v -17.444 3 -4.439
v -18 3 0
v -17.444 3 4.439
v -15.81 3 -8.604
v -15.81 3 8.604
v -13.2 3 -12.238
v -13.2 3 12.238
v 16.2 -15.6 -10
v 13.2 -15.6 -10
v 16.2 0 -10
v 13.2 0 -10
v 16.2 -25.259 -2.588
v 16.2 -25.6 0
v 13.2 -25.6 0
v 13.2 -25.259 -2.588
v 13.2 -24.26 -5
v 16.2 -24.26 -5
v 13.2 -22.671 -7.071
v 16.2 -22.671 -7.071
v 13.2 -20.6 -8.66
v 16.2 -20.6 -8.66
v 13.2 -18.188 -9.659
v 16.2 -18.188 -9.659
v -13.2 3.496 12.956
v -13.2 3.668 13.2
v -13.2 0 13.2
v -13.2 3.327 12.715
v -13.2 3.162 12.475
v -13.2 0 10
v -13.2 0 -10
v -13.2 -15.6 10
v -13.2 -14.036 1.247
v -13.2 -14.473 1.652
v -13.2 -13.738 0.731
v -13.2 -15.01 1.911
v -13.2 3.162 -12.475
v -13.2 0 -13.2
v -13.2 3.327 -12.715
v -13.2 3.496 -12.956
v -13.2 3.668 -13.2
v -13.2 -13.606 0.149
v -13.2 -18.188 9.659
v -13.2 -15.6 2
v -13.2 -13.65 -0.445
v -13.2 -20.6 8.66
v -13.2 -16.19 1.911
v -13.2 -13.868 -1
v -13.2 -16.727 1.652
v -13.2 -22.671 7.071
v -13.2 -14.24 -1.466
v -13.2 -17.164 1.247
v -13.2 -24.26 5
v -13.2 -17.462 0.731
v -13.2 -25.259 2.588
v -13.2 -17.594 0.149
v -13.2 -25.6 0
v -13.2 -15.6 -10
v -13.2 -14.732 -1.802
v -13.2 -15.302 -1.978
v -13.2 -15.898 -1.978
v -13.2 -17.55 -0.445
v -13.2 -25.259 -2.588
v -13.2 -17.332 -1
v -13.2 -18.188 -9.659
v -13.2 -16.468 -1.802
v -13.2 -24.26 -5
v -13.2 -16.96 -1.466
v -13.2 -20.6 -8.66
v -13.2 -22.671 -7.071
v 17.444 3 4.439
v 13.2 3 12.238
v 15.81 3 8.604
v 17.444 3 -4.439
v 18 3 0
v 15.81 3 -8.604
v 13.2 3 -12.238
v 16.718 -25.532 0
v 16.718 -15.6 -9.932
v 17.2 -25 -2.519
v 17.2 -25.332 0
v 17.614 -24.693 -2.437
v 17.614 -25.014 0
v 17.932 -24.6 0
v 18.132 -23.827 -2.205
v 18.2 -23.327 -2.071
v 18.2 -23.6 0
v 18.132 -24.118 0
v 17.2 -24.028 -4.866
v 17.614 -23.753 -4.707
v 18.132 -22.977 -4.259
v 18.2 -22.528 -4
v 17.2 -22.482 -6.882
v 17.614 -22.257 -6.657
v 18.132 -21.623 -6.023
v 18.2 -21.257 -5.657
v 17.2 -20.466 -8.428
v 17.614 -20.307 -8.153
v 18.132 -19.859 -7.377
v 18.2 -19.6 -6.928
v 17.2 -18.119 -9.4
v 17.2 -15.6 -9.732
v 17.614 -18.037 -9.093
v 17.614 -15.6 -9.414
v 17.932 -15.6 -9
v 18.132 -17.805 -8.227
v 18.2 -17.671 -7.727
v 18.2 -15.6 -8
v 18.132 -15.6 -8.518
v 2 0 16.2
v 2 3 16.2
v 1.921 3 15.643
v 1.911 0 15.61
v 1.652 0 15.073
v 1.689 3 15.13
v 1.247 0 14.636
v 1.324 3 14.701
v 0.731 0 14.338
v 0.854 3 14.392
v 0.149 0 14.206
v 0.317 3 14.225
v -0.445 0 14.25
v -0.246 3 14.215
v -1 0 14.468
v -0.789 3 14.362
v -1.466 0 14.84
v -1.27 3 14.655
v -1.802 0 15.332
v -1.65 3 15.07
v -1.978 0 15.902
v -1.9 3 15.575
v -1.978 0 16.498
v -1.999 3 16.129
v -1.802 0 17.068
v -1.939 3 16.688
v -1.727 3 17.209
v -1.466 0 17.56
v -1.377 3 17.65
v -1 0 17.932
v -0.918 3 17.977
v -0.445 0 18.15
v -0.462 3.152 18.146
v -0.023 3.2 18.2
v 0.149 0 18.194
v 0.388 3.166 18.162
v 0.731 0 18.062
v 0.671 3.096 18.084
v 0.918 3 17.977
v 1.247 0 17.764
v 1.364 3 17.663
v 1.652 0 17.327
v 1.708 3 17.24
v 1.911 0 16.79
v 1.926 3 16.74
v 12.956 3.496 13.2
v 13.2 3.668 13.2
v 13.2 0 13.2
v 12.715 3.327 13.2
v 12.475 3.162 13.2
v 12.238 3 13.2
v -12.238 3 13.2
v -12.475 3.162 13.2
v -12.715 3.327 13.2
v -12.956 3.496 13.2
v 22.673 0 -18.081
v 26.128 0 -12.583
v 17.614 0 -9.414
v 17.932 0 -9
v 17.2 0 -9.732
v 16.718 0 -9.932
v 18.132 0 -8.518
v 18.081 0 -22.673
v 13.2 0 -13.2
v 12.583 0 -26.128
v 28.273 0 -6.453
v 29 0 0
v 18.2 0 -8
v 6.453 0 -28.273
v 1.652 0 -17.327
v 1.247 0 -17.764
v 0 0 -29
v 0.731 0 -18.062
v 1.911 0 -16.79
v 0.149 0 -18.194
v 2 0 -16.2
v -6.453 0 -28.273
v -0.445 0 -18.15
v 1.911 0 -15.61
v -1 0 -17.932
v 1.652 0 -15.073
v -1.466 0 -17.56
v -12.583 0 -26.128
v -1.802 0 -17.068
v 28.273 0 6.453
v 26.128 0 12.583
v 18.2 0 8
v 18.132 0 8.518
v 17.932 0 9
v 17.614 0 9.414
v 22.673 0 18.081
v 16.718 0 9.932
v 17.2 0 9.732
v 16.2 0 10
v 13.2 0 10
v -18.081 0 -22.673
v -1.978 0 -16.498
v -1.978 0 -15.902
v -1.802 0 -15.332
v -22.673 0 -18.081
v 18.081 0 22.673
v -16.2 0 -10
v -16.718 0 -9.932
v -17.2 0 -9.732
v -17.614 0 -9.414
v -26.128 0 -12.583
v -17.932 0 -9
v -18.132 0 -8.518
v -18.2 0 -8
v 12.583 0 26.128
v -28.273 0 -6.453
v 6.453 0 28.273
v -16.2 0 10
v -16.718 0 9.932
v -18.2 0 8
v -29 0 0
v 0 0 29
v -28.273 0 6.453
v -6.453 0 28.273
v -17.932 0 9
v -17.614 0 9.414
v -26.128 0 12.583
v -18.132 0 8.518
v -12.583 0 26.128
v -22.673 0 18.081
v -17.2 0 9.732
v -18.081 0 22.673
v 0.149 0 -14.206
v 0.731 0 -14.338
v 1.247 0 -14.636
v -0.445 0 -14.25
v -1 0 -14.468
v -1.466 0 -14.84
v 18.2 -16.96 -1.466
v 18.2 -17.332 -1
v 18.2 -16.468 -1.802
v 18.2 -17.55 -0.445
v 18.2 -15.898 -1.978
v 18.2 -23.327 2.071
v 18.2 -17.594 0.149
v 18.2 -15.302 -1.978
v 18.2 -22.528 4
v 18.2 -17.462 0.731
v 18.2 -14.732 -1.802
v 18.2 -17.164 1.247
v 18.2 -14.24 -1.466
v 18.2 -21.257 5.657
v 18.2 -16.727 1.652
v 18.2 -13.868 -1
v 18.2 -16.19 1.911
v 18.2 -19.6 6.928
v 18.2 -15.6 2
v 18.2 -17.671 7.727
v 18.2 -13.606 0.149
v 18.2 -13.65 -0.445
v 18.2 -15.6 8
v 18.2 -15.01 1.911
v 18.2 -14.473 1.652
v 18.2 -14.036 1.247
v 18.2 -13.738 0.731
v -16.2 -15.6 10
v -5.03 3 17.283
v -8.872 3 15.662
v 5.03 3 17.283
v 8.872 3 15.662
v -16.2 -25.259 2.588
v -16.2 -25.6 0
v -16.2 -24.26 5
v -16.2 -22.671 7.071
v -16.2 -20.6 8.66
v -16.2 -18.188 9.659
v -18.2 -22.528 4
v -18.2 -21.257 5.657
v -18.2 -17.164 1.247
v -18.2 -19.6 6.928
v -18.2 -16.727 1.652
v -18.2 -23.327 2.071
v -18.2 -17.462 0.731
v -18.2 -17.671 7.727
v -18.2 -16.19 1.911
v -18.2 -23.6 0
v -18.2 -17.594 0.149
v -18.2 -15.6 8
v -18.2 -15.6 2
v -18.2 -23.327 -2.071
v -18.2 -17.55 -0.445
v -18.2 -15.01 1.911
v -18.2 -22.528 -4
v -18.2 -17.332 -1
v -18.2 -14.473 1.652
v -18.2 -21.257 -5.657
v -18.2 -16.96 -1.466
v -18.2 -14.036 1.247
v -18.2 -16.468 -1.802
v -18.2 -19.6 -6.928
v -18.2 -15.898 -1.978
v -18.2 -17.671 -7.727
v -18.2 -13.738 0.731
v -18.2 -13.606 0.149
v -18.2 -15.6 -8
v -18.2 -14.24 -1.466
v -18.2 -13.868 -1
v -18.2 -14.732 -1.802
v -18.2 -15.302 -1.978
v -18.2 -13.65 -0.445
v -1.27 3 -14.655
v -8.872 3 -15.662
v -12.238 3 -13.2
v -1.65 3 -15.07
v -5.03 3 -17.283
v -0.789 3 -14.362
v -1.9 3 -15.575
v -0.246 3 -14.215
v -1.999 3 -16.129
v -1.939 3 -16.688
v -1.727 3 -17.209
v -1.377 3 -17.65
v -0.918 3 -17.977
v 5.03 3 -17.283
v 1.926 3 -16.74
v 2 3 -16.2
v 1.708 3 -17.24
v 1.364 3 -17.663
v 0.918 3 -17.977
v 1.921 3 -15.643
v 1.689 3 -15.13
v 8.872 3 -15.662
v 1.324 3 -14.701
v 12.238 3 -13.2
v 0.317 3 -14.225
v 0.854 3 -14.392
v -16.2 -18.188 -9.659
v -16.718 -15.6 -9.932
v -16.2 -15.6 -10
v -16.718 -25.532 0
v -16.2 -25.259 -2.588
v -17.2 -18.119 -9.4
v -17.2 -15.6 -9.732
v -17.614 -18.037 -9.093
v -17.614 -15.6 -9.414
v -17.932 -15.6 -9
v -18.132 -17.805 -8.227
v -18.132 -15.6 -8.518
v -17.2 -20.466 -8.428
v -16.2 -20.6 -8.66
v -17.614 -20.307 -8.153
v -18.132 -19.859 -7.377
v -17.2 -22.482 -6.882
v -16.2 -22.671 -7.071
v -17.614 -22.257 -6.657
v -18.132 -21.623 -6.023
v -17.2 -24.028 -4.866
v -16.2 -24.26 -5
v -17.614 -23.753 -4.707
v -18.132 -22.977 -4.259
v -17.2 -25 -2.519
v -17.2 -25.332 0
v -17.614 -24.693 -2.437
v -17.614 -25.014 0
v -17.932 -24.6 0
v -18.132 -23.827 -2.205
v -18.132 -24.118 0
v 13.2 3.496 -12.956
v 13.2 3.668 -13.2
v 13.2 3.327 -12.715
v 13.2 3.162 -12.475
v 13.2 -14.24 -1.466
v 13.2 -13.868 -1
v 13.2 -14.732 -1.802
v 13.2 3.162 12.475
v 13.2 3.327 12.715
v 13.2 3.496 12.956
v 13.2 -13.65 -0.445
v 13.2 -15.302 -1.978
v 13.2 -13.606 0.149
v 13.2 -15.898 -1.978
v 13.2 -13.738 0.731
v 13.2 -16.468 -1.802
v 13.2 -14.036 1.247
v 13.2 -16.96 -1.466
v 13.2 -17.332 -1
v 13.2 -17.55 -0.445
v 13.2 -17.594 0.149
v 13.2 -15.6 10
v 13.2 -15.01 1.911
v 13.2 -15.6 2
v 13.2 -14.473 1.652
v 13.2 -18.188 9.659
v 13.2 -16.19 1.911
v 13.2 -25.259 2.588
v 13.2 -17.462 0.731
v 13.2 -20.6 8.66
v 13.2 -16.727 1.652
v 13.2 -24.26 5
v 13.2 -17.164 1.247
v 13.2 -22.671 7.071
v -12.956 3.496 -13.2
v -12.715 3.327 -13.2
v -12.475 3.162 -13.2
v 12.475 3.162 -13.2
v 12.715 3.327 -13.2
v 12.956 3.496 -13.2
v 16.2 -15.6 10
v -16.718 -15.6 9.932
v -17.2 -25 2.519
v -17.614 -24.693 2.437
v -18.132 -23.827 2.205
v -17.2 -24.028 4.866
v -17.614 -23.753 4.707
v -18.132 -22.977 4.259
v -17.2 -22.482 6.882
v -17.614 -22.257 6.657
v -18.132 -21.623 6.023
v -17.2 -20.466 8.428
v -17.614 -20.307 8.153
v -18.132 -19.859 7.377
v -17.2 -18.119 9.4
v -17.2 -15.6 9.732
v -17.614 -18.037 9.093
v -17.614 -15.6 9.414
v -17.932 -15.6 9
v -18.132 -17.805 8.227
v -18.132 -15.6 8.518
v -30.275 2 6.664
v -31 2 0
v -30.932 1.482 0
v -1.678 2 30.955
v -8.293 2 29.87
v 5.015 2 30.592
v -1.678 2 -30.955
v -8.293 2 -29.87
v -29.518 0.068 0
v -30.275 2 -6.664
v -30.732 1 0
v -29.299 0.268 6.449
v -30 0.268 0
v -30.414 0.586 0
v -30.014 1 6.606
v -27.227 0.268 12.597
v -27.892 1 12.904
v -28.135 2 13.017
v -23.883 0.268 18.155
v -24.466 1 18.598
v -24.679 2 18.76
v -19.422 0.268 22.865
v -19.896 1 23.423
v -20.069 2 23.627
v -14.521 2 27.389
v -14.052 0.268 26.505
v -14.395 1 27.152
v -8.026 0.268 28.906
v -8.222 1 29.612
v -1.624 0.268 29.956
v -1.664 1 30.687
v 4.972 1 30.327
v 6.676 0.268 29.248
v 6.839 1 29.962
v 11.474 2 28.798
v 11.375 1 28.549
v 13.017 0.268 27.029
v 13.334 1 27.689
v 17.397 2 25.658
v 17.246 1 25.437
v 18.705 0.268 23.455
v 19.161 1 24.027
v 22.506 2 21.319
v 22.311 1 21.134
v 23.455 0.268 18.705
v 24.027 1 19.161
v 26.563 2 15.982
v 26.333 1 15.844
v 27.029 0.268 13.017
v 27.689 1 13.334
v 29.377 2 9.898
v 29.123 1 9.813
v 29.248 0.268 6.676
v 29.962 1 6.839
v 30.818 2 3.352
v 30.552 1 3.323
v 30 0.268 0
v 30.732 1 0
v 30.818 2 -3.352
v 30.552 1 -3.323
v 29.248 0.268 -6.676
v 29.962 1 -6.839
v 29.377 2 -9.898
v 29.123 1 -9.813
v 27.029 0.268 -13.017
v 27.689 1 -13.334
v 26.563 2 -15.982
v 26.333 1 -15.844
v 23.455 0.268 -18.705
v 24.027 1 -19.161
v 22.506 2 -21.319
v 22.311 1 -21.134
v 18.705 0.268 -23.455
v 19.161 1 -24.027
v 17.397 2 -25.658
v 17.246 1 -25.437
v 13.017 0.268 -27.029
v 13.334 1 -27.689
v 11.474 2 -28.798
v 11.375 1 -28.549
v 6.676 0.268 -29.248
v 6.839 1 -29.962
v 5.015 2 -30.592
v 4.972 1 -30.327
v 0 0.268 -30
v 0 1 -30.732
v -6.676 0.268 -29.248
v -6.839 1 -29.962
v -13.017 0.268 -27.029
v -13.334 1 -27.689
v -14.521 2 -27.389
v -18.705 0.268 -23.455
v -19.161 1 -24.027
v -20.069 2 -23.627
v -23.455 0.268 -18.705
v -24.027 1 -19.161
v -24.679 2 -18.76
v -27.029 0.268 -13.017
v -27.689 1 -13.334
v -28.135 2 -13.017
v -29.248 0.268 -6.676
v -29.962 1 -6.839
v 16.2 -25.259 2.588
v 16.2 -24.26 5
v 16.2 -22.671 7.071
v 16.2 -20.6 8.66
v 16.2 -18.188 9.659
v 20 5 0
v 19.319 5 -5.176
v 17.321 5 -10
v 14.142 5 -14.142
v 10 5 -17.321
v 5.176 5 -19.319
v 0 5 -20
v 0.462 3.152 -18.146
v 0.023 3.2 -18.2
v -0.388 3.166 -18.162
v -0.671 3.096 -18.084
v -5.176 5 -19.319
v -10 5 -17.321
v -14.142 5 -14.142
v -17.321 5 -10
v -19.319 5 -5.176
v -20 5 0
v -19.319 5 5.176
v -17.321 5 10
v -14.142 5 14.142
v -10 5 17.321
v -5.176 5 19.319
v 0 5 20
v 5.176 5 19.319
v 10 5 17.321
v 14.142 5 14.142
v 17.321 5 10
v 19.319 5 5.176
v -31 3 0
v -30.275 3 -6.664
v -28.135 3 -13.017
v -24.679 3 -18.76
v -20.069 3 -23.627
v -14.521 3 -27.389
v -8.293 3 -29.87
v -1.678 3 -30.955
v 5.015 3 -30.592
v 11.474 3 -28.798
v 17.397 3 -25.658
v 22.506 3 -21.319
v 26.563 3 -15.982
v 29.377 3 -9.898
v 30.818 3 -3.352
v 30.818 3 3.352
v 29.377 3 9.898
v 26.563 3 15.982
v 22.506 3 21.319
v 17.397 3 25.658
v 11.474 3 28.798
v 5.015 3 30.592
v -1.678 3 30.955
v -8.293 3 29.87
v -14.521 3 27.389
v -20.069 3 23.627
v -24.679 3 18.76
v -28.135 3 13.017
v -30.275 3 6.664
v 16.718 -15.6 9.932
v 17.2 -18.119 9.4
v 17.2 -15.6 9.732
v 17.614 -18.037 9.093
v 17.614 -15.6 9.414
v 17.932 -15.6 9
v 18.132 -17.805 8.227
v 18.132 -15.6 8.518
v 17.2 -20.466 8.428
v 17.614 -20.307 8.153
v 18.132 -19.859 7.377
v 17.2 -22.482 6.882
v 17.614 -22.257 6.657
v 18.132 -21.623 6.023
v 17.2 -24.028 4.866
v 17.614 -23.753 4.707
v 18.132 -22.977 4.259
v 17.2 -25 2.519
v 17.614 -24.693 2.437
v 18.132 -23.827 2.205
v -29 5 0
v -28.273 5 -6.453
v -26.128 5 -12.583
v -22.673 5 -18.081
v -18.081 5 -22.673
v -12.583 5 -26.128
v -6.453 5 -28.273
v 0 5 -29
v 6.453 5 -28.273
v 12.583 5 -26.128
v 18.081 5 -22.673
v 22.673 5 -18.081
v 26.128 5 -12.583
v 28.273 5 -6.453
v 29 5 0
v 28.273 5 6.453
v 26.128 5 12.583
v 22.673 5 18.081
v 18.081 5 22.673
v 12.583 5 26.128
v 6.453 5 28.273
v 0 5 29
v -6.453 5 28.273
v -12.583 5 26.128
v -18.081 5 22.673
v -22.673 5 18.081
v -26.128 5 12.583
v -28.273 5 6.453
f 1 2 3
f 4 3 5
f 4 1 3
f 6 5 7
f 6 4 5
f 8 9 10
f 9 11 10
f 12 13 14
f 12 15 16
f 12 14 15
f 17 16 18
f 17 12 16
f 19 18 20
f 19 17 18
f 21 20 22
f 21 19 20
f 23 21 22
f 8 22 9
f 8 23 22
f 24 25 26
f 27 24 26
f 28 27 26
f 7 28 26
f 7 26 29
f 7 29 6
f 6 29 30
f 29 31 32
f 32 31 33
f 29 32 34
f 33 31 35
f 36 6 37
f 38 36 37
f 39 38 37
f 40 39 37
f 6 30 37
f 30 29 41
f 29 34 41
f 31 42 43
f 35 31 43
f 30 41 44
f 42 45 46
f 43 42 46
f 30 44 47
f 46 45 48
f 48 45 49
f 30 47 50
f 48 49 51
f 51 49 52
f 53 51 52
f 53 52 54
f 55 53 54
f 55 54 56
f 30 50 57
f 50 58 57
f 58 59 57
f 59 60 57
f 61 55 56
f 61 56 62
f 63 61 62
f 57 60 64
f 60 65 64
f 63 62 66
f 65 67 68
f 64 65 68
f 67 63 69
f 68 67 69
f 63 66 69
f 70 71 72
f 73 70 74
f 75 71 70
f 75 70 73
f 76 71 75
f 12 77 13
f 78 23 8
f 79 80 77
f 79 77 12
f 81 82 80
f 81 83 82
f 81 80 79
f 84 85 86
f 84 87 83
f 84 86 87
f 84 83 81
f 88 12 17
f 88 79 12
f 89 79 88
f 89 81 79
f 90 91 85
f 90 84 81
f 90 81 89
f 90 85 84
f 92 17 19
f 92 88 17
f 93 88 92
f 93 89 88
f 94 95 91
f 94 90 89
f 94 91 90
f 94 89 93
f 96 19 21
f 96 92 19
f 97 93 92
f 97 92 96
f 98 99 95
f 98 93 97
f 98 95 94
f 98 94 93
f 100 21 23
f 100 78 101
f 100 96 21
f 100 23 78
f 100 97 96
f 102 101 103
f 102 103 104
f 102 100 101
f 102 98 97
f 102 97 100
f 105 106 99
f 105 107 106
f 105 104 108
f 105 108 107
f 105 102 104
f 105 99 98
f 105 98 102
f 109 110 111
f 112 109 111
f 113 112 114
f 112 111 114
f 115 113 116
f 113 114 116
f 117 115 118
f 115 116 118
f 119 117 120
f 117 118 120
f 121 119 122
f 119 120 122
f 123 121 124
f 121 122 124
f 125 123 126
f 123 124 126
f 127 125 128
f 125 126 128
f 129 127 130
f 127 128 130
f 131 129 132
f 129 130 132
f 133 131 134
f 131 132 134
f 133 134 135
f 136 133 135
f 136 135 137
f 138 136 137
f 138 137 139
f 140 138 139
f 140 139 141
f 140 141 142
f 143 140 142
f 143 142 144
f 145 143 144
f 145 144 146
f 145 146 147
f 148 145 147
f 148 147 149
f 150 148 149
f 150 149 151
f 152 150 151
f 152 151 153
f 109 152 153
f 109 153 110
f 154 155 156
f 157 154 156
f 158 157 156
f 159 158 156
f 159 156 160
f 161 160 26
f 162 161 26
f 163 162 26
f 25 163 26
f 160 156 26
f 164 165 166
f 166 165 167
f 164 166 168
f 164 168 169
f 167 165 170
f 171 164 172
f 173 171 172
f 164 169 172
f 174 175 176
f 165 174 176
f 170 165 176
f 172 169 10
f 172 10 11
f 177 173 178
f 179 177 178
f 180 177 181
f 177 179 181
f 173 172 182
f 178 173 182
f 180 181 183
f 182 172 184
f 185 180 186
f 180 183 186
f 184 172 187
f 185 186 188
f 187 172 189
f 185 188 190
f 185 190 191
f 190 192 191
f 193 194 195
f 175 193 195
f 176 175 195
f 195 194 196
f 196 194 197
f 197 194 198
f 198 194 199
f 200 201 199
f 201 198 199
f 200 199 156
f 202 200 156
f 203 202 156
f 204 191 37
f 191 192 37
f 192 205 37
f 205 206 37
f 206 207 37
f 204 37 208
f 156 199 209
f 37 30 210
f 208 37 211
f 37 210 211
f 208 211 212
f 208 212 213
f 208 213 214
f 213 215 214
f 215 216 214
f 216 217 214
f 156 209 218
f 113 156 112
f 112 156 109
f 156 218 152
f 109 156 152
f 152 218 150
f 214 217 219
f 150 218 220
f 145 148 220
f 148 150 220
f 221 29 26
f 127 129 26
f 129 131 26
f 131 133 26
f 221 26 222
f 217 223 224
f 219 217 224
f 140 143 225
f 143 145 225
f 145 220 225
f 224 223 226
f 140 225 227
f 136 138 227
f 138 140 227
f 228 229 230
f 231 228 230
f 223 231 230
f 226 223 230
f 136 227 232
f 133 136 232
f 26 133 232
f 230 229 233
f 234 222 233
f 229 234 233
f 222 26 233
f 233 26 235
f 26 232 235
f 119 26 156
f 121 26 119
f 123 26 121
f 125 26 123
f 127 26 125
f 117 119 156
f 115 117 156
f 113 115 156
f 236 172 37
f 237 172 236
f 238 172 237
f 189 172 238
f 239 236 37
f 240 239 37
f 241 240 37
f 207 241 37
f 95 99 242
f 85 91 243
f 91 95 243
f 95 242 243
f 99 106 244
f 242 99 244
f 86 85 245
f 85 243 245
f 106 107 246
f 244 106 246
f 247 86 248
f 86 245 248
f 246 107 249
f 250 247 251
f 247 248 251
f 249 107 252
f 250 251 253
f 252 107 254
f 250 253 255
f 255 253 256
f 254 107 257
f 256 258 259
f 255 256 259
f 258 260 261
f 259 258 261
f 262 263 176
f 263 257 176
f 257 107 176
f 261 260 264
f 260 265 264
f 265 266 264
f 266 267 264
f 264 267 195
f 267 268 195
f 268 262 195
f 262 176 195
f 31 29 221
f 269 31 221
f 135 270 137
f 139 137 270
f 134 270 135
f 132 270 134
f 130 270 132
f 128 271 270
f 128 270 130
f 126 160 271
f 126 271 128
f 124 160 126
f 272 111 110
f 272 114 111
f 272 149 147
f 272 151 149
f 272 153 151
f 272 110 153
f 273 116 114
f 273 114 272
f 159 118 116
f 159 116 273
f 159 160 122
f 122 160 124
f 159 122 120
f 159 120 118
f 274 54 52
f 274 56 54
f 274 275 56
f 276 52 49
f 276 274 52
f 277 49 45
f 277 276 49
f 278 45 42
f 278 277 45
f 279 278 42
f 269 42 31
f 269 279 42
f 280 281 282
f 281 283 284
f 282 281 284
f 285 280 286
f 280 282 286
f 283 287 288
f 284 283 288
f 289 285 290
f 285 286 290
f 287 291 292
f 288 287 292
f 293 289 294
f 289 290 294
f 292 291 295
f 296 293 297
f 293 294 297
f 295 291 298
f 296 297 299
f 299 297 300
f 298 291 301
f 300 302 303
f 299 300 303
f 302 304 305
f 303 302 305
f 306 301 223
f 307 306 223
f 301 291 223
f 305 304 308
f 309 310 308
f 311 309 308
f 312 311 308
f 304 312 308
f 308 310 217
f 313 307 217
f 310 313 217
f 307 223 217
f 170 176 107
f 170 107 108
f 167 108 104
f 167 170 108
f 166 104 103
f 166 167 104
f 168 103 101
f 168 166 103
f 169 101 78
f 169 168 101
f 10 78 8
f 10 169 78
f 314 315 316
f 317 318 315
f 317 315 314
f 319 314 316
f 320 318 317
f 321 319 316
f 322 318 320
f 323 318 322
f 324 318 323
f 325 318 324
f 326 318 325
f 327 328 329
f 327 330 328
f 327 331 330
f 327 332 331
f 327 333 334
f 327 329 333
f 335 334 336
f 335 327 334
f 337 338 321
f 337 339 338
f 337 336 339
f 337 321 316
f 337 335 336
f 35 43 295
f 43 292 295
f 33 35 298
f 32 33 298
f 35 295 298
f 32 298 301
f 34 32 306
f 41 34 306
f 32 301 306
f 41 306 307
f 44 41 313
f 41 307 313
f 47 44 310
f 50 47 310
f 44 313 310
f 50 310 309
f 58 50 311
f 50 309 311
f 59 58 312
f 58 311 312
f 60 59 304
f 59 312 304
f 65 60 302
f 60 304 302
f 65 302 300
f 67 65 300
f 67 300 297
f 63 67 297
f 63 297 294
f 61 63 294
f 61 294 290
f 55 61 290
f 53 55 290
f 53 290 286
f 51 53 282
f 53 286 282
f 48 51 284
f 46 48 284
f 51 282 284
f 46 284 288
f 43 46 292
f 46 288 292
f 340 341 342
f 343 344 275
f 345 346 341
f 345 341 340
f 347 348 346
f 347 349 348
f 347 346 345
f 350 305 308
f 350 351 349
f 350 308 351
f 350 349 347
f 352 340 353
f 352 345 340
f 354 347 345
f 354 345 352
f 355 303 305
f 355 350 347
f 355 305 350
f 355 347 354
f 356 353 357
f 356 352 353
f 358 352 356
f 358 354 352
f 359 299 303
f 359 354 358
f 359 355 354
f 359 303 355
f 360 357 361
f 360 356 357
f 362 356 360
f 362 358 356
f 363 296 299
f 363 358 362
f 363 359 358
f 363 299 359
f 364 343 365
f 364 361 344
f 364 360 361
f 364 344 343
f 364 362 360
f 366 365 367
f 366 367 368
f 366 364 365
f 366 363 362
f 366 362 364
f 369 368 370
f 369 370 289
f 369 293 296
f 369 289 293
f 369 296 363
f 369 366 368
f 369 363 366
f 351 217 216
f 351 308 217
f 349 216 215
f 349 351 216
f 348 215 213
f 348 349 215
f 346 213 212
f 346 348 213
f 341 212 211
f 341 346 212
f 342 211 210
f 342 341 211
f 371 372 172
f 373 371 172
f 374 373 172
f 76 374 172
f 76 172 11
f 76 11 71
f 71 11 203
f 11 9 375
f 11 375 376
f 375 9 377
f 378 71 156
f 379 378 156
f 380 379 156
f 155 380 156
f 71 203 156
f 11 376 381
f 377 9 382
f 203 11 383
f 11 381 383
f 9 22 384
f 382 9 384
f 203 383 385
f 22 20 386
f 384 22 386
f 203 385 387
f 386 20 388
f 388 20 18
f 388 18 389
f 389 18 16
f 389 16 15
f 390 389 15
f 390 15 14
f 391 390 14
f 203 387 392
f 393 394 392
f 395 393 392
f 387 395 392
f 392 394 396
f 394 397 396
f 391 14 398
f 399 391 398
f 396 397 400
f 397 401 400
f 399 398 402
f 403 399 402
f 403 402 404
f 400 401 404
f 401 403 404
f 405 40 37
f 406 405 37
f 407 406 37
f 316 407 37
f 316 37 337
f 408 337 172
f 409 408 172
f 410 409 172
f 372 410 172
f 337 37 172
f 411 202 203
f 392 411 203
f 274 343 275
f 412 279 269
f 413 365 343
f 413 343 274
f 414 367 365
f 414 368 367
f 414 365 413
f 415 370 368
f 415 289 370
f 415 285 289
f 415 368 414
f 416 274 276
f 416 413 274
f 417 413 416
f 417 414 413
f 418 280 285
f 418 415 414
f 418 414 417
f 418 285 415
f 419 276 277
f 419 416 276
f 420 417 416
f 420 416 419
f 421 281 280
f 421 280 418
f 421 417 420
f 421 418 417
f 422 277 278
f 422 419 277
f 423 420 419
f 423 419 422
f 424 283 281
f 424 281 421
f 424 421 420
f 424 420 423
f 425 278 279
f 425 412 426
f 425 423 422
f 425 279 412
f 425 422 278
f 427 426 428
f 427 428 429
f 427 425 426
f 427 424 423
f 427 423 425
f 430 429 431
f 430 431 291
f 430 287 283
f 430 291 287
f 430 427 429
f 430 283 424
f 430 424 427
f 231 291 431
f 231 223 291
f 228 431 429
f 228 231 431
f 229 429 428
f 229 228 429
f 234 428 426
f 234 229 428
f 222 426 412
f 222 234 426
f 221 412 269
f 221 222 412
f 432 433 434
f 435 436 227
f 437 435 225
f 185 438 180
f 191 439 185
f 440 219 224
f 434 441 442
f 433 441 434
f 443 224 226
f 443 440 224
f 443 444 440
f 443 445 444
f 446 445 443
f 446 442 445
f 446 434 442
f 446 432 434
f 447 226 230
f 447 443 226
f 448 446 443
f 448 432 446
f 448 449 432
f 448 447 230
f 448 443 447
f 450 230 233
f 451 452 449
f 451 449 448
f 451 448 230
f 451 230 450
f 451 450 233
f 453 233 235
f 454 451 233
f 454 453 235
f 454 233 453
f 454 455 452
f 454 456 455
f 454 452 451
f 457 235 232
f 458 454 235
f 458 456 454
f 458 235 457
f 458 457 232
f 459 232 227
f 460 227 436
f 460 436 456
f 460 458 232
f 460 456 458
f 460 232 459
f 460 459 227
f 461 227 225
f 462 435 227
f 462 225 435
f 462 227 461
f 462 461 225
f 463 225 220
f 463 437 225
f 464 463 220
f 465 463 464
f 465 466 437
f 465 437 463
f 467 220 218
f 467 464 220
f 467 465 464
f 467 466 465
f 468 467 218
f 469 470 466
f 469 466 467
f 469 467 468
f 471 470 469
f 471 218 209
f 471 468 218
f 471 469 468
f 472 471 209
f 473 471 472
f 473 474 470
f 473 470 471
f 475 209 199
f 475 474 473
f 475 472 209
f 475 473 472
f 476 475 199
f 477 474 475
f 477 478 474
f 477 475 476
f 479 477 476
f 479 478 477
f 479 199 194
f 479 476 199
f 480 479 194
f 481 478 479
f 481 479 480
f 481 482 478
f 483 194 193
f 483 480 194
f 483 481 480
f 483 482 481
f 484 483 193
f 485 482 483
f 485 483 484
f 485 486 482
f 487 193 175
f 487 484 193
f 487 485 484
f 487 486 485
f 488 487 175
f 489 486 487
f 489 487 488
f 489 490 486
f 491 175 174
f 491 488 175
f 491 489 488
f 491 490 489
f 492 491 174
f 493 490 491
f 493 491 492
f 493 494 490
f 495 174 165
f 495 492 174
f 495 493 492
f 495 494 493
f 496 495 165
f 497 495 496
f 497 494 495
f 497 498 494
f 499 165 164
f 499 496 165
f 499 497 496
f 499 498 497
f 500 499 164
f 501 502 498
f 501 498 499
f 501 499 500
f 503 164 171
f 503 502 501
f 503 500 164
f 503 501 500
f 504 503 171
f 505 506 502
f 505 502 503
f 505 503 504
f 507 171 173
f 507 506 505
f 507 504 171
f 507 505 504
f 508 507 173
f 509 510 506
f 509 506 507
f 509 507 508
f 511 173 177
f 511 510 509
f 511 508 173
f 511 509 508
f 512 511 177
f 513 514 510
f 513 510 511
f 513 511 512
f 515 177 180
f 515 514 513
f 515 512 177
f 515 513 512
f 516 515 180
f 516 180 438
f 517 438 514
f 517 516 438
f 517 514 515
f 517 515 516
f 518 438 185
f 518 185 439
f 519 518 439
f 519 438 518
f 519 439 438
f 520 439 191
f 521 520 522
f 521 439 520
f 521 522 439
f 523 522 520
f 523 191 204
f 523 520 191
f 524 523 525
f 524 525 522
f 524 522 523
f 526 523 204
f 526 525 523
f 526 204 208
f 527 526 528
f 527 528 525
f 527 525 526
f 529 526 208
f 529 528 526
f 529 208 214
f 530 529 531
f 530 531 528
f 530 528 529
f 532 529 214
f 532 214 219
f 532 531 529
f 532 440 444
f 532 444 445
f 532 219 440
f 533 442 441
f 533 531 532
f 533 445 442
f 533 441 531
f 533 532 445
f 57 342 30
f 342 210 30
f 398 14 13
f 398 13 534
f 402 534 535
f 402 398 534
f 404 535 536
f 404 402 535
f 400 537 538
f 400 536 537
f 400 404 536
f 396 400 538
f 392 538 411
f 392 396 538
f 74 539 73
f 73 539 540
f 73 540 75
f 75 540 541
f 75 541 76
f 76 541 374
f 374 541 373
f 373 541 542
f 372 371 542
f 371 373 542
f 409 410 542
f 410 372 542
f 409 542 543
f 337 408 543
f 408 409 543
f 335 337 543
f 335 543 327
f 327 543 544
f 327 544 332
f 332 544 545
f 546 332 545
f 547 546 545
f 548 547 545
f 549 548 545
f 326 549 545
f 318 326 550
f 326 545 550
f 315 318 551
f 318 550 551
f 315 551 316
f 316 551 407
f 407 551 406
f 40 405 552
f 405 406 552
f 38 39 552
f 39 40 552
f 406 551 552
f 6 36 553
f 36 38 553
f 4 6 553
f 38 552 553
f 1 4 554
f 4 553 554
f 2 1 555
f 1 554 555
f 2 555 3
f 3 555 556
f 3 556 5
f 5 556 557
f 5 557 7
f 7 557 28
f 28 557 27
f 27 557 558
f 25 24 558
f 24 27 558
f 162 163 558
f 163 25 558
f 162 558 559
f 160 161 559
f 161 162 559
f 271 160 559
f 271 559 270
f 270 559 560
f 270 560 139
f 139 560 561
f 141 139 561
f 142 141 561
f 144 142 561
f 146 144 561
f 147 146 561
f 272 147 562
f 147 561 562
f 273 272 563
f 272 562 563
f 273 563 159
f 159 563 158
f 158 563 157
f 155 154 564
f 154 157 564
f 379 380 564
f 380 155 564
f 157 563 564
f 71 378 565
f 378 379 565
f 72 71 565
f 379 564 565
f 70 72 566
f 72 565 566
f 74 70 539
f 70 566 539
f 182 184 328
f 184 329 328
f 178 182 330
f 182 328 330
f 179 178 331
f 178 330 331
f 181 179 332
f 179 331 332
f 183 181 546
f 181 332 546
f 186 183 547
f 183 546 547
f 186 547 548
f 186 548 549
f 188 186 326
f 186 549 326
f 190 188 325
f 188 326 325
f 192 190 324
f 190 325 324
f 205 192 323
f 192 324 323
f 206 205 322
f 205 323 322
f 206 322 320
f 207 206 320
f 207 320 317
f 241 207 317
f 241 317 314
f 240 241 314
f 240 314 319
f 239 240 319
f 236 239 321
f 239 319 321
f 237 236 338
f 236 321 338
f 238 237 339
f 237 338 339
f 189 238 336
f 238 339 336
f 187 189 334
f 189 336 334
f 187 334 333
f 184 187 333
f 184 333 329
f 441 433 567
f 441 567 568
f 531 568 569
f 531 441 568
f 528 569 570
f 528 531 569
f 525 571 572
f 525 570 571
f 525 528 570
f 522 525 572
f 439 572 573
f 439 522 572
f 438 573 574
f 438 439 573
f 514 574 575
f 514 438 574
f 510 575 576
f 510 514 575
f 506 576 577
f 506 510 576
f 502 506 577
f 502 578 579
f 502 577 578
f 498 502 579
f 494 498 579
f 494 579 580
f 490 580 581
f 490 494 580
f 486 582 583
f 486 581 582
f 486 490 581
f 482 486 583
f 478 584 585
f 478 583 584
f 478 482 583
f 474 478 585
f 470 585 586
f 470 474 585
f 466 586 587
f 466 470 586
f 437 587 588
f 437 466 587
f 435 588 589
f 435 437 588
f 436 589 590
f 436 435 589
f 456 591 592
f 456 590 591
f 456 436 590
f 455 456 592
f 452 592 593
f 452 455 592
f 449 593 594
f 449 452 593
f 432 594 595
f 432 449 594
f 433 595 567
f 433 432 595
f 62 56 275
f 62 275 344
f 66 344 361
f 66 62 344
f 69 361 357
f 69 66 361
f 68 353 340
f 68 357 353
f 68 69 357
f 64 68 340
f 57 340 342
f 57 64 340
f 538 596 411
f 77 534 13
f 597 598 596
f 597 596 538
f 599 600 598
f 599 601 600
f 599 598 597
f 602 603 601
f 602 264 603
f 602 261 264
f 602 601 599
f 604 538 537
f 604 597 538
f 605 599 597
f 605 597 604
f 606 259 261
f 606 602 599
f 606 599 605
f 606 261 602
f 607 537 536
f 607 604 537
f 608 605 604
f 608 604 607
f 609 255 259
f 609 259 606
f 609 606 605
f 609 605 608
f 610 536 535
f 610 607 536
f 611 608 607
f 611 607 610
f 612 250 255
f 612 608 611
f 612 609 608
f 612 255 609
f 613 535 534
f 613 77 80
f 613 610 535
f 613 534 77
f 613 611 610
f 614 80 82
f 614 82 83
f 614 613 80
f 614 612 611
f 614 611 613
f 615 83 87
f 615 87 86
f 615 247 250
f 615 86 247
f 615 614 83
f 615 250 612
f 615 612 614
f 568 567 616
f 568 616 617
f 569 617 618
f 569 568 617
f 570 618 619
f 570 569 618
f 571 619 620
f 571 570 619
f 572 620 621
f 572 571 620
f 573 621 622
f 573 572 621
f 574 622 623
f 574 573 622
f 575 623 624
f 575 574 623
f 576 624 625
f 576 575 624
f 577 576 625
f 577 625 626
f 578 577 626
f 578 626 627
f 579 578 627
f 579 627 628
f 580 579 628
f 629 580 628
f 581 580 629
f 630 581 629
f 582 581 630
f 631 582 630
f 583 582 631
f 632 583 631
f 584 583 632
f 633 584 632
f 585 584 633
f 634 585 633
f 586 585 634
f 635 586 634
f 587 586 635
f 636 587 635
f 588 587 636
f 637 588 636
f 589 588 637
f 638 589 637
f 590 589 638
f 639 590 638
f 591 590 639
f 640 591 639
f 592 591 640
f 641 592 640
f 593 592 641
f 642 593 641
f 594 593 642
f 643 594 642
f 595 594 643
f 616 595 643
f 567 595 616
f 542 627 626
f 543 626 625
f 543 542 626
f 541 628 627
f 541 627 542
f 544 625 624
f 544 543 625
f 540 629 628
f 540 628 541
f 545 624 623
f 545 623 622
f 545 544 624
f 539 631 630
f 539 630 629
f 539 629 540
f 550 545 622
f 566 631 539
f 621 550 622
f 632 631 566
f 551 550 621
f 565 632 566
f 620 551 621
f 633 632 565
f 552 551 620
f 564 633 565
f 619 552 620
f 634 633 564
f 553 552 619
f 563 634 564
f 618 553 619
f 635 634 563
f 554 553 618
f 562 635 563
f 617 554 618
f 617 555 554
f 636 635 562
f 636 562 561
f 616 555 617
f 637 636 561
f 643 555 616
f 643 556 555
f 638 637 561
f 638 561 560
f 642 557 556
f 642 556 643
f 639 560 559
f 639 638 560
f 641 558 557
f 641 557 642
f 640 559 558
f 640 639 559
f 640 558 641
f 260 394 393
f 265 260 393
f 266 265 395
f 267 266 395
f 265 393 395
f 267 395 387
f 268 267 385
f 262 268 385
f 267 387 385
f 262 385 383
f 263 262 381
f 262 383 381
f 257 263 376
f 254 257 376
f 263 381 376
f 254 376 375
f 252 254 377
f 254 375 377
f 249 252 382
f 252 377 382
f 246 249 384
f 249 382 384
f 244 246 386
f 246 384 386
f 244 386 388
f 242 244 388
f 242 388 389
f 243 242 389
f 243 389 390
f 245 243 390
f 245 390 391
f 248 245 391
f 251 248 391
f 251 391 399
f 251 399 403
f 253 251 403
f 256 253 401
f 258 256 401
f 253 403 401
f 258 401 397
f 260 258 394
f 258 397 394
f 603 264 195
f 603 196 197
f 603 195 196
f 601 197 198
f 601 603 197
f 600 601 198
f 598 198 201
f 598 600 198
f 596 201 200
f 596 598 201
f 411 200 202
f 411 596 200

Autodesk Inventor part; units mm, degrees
ref_plane "YZ Plane" through (0, 0, 0) normal (1, 0, 0) x (0, 1, 0)
ref_plane "XZ Plane" through (0, 0, 0) normal (0, 1, 0) x (-1, 0, 0)
ref_plane "XY Plane" through (0, 0, 0) normal (0, 0, 1) x (1, 0, 0)
sketch "Sketch1" plane through (0, 0, 0) normal (0, 1, 0) x (-1, 0, 0)
  circle A0 centre (0, 0) radius 31
  dimension "d0" = 62
extrude "Extrusion1" add sketch "Sketch1" along normal blind 5
sketch "Sketch2" plane through (0, 5, 0) normal (0, 1, 0) x (1, 0, 0)
  circle A0 centre (0, 0) radius 20
  dimension "d3" = 40
extrude "Extrusion2" cut sketch "Sketch2" against normal blind 2
chamfer "Chamfer1" distance 2 angle 45 1 edges at (-20, 3, 0)
sketch "Sketch3" plane through (0, 0, 0) normal (0, -1, 0) x (1, 0, 0)
  line L0 (13.2, 13.2) -> (-13.2, 13.2)
  line L1 (-13.2, 13.2) -> (-13.2, -13.2)
  line L2 (-13.2, -13.2) -> (13.2, -13.2)
  line L3 (13.2, -13.2) -> (13.2, 13.2)
  point P0 (0, 0)
  dimension "d9" = 26.4
  dimension "d10" = 26.4
extrude "Extrusion3" cut sketch "Sketch3" against normal blind 6
sketch "Sketch4" plane through (0, 5, 0) normal (0, 1, 0) x (1, 0, 0)
  circle A0 centre (0, 16.2) radius 2
  circle A1 centre (0, -16.2) radius 2
  point P0 (0, 0)
  dimension "d13" = 4
  dimension "d14" = 4
extrude "Extrusion4" cut sketch "Sketch4" against normal blind 6
sketch "Sketch5" plane through (0, 0, 0) normal (0, -1, 0) x (1, 0, 0)
  line L0 (-13.2, -13.2) -> (-13.2, 13.2) projected
  line L1 (-13.2, 10) -> (-18.2, 10)
  line L2 (-18.2, 10) -> (-18.2, -10)
  line L3 (-18.2, -10) -> (-13.2, -10)
  line L4 (-13.2, -10) -> (-13.2, 10)
  line L5 (13.2, 13.2) -> (13.2, -13.2) projected
  line L6 (13.2, -10) -> (18.2, -10)
  line L7 (18.2, -10) -> (18.2, 10)
  line L8 (18.2, 10) -> (13.2, 10)
  line L9 (13.2, 10) -> (13.2, -10)
  point P0 (0, 0)
  dimension "d17" = 5
  dimension "d18" = 20
  dimension "d19" = 5
  dimension "d20" = 20
extrude "Extrusion5" add sketch "Sketch5" along normal blind 25.6
fillet "Fillet1" radius 10 4 edges at (15.7, -25.6, 10) (15.7, -25.6, -10) (-15.7, -25.6, -10) (-15.7, -25.6, 10)
fillet "Fillet2" radius 2 7 edges at (31, 0, 0) (18.2, -7.8001, 10) (18.2, -7.8001, -10) (18.2, -22.6711, 7.0711) (-18.2, -7.8001, -10) (-18.2, -7.8001, 10) (-18.2, -22.6711, -7.0711)
sketch "Sketch6" plane through (-18.2, 0, -8) normal (-1, 0, 0) x (0, 0, 1)
  circle A0 centre (8, -15.6) radius 2
  line L0 (0, 0) -> (16, 0) projected
  point P0 (8, 0)
  dimension "d25" = 4
  dimension "d31" = 15.6
extrude "Extrusion6" cut sketch "Sketch6" against normal blind 50
chamfer "Chamfer2" distance 2 angle 45 1 edges at (31, 5, 0)
properties part number "bigSpringMountB"
